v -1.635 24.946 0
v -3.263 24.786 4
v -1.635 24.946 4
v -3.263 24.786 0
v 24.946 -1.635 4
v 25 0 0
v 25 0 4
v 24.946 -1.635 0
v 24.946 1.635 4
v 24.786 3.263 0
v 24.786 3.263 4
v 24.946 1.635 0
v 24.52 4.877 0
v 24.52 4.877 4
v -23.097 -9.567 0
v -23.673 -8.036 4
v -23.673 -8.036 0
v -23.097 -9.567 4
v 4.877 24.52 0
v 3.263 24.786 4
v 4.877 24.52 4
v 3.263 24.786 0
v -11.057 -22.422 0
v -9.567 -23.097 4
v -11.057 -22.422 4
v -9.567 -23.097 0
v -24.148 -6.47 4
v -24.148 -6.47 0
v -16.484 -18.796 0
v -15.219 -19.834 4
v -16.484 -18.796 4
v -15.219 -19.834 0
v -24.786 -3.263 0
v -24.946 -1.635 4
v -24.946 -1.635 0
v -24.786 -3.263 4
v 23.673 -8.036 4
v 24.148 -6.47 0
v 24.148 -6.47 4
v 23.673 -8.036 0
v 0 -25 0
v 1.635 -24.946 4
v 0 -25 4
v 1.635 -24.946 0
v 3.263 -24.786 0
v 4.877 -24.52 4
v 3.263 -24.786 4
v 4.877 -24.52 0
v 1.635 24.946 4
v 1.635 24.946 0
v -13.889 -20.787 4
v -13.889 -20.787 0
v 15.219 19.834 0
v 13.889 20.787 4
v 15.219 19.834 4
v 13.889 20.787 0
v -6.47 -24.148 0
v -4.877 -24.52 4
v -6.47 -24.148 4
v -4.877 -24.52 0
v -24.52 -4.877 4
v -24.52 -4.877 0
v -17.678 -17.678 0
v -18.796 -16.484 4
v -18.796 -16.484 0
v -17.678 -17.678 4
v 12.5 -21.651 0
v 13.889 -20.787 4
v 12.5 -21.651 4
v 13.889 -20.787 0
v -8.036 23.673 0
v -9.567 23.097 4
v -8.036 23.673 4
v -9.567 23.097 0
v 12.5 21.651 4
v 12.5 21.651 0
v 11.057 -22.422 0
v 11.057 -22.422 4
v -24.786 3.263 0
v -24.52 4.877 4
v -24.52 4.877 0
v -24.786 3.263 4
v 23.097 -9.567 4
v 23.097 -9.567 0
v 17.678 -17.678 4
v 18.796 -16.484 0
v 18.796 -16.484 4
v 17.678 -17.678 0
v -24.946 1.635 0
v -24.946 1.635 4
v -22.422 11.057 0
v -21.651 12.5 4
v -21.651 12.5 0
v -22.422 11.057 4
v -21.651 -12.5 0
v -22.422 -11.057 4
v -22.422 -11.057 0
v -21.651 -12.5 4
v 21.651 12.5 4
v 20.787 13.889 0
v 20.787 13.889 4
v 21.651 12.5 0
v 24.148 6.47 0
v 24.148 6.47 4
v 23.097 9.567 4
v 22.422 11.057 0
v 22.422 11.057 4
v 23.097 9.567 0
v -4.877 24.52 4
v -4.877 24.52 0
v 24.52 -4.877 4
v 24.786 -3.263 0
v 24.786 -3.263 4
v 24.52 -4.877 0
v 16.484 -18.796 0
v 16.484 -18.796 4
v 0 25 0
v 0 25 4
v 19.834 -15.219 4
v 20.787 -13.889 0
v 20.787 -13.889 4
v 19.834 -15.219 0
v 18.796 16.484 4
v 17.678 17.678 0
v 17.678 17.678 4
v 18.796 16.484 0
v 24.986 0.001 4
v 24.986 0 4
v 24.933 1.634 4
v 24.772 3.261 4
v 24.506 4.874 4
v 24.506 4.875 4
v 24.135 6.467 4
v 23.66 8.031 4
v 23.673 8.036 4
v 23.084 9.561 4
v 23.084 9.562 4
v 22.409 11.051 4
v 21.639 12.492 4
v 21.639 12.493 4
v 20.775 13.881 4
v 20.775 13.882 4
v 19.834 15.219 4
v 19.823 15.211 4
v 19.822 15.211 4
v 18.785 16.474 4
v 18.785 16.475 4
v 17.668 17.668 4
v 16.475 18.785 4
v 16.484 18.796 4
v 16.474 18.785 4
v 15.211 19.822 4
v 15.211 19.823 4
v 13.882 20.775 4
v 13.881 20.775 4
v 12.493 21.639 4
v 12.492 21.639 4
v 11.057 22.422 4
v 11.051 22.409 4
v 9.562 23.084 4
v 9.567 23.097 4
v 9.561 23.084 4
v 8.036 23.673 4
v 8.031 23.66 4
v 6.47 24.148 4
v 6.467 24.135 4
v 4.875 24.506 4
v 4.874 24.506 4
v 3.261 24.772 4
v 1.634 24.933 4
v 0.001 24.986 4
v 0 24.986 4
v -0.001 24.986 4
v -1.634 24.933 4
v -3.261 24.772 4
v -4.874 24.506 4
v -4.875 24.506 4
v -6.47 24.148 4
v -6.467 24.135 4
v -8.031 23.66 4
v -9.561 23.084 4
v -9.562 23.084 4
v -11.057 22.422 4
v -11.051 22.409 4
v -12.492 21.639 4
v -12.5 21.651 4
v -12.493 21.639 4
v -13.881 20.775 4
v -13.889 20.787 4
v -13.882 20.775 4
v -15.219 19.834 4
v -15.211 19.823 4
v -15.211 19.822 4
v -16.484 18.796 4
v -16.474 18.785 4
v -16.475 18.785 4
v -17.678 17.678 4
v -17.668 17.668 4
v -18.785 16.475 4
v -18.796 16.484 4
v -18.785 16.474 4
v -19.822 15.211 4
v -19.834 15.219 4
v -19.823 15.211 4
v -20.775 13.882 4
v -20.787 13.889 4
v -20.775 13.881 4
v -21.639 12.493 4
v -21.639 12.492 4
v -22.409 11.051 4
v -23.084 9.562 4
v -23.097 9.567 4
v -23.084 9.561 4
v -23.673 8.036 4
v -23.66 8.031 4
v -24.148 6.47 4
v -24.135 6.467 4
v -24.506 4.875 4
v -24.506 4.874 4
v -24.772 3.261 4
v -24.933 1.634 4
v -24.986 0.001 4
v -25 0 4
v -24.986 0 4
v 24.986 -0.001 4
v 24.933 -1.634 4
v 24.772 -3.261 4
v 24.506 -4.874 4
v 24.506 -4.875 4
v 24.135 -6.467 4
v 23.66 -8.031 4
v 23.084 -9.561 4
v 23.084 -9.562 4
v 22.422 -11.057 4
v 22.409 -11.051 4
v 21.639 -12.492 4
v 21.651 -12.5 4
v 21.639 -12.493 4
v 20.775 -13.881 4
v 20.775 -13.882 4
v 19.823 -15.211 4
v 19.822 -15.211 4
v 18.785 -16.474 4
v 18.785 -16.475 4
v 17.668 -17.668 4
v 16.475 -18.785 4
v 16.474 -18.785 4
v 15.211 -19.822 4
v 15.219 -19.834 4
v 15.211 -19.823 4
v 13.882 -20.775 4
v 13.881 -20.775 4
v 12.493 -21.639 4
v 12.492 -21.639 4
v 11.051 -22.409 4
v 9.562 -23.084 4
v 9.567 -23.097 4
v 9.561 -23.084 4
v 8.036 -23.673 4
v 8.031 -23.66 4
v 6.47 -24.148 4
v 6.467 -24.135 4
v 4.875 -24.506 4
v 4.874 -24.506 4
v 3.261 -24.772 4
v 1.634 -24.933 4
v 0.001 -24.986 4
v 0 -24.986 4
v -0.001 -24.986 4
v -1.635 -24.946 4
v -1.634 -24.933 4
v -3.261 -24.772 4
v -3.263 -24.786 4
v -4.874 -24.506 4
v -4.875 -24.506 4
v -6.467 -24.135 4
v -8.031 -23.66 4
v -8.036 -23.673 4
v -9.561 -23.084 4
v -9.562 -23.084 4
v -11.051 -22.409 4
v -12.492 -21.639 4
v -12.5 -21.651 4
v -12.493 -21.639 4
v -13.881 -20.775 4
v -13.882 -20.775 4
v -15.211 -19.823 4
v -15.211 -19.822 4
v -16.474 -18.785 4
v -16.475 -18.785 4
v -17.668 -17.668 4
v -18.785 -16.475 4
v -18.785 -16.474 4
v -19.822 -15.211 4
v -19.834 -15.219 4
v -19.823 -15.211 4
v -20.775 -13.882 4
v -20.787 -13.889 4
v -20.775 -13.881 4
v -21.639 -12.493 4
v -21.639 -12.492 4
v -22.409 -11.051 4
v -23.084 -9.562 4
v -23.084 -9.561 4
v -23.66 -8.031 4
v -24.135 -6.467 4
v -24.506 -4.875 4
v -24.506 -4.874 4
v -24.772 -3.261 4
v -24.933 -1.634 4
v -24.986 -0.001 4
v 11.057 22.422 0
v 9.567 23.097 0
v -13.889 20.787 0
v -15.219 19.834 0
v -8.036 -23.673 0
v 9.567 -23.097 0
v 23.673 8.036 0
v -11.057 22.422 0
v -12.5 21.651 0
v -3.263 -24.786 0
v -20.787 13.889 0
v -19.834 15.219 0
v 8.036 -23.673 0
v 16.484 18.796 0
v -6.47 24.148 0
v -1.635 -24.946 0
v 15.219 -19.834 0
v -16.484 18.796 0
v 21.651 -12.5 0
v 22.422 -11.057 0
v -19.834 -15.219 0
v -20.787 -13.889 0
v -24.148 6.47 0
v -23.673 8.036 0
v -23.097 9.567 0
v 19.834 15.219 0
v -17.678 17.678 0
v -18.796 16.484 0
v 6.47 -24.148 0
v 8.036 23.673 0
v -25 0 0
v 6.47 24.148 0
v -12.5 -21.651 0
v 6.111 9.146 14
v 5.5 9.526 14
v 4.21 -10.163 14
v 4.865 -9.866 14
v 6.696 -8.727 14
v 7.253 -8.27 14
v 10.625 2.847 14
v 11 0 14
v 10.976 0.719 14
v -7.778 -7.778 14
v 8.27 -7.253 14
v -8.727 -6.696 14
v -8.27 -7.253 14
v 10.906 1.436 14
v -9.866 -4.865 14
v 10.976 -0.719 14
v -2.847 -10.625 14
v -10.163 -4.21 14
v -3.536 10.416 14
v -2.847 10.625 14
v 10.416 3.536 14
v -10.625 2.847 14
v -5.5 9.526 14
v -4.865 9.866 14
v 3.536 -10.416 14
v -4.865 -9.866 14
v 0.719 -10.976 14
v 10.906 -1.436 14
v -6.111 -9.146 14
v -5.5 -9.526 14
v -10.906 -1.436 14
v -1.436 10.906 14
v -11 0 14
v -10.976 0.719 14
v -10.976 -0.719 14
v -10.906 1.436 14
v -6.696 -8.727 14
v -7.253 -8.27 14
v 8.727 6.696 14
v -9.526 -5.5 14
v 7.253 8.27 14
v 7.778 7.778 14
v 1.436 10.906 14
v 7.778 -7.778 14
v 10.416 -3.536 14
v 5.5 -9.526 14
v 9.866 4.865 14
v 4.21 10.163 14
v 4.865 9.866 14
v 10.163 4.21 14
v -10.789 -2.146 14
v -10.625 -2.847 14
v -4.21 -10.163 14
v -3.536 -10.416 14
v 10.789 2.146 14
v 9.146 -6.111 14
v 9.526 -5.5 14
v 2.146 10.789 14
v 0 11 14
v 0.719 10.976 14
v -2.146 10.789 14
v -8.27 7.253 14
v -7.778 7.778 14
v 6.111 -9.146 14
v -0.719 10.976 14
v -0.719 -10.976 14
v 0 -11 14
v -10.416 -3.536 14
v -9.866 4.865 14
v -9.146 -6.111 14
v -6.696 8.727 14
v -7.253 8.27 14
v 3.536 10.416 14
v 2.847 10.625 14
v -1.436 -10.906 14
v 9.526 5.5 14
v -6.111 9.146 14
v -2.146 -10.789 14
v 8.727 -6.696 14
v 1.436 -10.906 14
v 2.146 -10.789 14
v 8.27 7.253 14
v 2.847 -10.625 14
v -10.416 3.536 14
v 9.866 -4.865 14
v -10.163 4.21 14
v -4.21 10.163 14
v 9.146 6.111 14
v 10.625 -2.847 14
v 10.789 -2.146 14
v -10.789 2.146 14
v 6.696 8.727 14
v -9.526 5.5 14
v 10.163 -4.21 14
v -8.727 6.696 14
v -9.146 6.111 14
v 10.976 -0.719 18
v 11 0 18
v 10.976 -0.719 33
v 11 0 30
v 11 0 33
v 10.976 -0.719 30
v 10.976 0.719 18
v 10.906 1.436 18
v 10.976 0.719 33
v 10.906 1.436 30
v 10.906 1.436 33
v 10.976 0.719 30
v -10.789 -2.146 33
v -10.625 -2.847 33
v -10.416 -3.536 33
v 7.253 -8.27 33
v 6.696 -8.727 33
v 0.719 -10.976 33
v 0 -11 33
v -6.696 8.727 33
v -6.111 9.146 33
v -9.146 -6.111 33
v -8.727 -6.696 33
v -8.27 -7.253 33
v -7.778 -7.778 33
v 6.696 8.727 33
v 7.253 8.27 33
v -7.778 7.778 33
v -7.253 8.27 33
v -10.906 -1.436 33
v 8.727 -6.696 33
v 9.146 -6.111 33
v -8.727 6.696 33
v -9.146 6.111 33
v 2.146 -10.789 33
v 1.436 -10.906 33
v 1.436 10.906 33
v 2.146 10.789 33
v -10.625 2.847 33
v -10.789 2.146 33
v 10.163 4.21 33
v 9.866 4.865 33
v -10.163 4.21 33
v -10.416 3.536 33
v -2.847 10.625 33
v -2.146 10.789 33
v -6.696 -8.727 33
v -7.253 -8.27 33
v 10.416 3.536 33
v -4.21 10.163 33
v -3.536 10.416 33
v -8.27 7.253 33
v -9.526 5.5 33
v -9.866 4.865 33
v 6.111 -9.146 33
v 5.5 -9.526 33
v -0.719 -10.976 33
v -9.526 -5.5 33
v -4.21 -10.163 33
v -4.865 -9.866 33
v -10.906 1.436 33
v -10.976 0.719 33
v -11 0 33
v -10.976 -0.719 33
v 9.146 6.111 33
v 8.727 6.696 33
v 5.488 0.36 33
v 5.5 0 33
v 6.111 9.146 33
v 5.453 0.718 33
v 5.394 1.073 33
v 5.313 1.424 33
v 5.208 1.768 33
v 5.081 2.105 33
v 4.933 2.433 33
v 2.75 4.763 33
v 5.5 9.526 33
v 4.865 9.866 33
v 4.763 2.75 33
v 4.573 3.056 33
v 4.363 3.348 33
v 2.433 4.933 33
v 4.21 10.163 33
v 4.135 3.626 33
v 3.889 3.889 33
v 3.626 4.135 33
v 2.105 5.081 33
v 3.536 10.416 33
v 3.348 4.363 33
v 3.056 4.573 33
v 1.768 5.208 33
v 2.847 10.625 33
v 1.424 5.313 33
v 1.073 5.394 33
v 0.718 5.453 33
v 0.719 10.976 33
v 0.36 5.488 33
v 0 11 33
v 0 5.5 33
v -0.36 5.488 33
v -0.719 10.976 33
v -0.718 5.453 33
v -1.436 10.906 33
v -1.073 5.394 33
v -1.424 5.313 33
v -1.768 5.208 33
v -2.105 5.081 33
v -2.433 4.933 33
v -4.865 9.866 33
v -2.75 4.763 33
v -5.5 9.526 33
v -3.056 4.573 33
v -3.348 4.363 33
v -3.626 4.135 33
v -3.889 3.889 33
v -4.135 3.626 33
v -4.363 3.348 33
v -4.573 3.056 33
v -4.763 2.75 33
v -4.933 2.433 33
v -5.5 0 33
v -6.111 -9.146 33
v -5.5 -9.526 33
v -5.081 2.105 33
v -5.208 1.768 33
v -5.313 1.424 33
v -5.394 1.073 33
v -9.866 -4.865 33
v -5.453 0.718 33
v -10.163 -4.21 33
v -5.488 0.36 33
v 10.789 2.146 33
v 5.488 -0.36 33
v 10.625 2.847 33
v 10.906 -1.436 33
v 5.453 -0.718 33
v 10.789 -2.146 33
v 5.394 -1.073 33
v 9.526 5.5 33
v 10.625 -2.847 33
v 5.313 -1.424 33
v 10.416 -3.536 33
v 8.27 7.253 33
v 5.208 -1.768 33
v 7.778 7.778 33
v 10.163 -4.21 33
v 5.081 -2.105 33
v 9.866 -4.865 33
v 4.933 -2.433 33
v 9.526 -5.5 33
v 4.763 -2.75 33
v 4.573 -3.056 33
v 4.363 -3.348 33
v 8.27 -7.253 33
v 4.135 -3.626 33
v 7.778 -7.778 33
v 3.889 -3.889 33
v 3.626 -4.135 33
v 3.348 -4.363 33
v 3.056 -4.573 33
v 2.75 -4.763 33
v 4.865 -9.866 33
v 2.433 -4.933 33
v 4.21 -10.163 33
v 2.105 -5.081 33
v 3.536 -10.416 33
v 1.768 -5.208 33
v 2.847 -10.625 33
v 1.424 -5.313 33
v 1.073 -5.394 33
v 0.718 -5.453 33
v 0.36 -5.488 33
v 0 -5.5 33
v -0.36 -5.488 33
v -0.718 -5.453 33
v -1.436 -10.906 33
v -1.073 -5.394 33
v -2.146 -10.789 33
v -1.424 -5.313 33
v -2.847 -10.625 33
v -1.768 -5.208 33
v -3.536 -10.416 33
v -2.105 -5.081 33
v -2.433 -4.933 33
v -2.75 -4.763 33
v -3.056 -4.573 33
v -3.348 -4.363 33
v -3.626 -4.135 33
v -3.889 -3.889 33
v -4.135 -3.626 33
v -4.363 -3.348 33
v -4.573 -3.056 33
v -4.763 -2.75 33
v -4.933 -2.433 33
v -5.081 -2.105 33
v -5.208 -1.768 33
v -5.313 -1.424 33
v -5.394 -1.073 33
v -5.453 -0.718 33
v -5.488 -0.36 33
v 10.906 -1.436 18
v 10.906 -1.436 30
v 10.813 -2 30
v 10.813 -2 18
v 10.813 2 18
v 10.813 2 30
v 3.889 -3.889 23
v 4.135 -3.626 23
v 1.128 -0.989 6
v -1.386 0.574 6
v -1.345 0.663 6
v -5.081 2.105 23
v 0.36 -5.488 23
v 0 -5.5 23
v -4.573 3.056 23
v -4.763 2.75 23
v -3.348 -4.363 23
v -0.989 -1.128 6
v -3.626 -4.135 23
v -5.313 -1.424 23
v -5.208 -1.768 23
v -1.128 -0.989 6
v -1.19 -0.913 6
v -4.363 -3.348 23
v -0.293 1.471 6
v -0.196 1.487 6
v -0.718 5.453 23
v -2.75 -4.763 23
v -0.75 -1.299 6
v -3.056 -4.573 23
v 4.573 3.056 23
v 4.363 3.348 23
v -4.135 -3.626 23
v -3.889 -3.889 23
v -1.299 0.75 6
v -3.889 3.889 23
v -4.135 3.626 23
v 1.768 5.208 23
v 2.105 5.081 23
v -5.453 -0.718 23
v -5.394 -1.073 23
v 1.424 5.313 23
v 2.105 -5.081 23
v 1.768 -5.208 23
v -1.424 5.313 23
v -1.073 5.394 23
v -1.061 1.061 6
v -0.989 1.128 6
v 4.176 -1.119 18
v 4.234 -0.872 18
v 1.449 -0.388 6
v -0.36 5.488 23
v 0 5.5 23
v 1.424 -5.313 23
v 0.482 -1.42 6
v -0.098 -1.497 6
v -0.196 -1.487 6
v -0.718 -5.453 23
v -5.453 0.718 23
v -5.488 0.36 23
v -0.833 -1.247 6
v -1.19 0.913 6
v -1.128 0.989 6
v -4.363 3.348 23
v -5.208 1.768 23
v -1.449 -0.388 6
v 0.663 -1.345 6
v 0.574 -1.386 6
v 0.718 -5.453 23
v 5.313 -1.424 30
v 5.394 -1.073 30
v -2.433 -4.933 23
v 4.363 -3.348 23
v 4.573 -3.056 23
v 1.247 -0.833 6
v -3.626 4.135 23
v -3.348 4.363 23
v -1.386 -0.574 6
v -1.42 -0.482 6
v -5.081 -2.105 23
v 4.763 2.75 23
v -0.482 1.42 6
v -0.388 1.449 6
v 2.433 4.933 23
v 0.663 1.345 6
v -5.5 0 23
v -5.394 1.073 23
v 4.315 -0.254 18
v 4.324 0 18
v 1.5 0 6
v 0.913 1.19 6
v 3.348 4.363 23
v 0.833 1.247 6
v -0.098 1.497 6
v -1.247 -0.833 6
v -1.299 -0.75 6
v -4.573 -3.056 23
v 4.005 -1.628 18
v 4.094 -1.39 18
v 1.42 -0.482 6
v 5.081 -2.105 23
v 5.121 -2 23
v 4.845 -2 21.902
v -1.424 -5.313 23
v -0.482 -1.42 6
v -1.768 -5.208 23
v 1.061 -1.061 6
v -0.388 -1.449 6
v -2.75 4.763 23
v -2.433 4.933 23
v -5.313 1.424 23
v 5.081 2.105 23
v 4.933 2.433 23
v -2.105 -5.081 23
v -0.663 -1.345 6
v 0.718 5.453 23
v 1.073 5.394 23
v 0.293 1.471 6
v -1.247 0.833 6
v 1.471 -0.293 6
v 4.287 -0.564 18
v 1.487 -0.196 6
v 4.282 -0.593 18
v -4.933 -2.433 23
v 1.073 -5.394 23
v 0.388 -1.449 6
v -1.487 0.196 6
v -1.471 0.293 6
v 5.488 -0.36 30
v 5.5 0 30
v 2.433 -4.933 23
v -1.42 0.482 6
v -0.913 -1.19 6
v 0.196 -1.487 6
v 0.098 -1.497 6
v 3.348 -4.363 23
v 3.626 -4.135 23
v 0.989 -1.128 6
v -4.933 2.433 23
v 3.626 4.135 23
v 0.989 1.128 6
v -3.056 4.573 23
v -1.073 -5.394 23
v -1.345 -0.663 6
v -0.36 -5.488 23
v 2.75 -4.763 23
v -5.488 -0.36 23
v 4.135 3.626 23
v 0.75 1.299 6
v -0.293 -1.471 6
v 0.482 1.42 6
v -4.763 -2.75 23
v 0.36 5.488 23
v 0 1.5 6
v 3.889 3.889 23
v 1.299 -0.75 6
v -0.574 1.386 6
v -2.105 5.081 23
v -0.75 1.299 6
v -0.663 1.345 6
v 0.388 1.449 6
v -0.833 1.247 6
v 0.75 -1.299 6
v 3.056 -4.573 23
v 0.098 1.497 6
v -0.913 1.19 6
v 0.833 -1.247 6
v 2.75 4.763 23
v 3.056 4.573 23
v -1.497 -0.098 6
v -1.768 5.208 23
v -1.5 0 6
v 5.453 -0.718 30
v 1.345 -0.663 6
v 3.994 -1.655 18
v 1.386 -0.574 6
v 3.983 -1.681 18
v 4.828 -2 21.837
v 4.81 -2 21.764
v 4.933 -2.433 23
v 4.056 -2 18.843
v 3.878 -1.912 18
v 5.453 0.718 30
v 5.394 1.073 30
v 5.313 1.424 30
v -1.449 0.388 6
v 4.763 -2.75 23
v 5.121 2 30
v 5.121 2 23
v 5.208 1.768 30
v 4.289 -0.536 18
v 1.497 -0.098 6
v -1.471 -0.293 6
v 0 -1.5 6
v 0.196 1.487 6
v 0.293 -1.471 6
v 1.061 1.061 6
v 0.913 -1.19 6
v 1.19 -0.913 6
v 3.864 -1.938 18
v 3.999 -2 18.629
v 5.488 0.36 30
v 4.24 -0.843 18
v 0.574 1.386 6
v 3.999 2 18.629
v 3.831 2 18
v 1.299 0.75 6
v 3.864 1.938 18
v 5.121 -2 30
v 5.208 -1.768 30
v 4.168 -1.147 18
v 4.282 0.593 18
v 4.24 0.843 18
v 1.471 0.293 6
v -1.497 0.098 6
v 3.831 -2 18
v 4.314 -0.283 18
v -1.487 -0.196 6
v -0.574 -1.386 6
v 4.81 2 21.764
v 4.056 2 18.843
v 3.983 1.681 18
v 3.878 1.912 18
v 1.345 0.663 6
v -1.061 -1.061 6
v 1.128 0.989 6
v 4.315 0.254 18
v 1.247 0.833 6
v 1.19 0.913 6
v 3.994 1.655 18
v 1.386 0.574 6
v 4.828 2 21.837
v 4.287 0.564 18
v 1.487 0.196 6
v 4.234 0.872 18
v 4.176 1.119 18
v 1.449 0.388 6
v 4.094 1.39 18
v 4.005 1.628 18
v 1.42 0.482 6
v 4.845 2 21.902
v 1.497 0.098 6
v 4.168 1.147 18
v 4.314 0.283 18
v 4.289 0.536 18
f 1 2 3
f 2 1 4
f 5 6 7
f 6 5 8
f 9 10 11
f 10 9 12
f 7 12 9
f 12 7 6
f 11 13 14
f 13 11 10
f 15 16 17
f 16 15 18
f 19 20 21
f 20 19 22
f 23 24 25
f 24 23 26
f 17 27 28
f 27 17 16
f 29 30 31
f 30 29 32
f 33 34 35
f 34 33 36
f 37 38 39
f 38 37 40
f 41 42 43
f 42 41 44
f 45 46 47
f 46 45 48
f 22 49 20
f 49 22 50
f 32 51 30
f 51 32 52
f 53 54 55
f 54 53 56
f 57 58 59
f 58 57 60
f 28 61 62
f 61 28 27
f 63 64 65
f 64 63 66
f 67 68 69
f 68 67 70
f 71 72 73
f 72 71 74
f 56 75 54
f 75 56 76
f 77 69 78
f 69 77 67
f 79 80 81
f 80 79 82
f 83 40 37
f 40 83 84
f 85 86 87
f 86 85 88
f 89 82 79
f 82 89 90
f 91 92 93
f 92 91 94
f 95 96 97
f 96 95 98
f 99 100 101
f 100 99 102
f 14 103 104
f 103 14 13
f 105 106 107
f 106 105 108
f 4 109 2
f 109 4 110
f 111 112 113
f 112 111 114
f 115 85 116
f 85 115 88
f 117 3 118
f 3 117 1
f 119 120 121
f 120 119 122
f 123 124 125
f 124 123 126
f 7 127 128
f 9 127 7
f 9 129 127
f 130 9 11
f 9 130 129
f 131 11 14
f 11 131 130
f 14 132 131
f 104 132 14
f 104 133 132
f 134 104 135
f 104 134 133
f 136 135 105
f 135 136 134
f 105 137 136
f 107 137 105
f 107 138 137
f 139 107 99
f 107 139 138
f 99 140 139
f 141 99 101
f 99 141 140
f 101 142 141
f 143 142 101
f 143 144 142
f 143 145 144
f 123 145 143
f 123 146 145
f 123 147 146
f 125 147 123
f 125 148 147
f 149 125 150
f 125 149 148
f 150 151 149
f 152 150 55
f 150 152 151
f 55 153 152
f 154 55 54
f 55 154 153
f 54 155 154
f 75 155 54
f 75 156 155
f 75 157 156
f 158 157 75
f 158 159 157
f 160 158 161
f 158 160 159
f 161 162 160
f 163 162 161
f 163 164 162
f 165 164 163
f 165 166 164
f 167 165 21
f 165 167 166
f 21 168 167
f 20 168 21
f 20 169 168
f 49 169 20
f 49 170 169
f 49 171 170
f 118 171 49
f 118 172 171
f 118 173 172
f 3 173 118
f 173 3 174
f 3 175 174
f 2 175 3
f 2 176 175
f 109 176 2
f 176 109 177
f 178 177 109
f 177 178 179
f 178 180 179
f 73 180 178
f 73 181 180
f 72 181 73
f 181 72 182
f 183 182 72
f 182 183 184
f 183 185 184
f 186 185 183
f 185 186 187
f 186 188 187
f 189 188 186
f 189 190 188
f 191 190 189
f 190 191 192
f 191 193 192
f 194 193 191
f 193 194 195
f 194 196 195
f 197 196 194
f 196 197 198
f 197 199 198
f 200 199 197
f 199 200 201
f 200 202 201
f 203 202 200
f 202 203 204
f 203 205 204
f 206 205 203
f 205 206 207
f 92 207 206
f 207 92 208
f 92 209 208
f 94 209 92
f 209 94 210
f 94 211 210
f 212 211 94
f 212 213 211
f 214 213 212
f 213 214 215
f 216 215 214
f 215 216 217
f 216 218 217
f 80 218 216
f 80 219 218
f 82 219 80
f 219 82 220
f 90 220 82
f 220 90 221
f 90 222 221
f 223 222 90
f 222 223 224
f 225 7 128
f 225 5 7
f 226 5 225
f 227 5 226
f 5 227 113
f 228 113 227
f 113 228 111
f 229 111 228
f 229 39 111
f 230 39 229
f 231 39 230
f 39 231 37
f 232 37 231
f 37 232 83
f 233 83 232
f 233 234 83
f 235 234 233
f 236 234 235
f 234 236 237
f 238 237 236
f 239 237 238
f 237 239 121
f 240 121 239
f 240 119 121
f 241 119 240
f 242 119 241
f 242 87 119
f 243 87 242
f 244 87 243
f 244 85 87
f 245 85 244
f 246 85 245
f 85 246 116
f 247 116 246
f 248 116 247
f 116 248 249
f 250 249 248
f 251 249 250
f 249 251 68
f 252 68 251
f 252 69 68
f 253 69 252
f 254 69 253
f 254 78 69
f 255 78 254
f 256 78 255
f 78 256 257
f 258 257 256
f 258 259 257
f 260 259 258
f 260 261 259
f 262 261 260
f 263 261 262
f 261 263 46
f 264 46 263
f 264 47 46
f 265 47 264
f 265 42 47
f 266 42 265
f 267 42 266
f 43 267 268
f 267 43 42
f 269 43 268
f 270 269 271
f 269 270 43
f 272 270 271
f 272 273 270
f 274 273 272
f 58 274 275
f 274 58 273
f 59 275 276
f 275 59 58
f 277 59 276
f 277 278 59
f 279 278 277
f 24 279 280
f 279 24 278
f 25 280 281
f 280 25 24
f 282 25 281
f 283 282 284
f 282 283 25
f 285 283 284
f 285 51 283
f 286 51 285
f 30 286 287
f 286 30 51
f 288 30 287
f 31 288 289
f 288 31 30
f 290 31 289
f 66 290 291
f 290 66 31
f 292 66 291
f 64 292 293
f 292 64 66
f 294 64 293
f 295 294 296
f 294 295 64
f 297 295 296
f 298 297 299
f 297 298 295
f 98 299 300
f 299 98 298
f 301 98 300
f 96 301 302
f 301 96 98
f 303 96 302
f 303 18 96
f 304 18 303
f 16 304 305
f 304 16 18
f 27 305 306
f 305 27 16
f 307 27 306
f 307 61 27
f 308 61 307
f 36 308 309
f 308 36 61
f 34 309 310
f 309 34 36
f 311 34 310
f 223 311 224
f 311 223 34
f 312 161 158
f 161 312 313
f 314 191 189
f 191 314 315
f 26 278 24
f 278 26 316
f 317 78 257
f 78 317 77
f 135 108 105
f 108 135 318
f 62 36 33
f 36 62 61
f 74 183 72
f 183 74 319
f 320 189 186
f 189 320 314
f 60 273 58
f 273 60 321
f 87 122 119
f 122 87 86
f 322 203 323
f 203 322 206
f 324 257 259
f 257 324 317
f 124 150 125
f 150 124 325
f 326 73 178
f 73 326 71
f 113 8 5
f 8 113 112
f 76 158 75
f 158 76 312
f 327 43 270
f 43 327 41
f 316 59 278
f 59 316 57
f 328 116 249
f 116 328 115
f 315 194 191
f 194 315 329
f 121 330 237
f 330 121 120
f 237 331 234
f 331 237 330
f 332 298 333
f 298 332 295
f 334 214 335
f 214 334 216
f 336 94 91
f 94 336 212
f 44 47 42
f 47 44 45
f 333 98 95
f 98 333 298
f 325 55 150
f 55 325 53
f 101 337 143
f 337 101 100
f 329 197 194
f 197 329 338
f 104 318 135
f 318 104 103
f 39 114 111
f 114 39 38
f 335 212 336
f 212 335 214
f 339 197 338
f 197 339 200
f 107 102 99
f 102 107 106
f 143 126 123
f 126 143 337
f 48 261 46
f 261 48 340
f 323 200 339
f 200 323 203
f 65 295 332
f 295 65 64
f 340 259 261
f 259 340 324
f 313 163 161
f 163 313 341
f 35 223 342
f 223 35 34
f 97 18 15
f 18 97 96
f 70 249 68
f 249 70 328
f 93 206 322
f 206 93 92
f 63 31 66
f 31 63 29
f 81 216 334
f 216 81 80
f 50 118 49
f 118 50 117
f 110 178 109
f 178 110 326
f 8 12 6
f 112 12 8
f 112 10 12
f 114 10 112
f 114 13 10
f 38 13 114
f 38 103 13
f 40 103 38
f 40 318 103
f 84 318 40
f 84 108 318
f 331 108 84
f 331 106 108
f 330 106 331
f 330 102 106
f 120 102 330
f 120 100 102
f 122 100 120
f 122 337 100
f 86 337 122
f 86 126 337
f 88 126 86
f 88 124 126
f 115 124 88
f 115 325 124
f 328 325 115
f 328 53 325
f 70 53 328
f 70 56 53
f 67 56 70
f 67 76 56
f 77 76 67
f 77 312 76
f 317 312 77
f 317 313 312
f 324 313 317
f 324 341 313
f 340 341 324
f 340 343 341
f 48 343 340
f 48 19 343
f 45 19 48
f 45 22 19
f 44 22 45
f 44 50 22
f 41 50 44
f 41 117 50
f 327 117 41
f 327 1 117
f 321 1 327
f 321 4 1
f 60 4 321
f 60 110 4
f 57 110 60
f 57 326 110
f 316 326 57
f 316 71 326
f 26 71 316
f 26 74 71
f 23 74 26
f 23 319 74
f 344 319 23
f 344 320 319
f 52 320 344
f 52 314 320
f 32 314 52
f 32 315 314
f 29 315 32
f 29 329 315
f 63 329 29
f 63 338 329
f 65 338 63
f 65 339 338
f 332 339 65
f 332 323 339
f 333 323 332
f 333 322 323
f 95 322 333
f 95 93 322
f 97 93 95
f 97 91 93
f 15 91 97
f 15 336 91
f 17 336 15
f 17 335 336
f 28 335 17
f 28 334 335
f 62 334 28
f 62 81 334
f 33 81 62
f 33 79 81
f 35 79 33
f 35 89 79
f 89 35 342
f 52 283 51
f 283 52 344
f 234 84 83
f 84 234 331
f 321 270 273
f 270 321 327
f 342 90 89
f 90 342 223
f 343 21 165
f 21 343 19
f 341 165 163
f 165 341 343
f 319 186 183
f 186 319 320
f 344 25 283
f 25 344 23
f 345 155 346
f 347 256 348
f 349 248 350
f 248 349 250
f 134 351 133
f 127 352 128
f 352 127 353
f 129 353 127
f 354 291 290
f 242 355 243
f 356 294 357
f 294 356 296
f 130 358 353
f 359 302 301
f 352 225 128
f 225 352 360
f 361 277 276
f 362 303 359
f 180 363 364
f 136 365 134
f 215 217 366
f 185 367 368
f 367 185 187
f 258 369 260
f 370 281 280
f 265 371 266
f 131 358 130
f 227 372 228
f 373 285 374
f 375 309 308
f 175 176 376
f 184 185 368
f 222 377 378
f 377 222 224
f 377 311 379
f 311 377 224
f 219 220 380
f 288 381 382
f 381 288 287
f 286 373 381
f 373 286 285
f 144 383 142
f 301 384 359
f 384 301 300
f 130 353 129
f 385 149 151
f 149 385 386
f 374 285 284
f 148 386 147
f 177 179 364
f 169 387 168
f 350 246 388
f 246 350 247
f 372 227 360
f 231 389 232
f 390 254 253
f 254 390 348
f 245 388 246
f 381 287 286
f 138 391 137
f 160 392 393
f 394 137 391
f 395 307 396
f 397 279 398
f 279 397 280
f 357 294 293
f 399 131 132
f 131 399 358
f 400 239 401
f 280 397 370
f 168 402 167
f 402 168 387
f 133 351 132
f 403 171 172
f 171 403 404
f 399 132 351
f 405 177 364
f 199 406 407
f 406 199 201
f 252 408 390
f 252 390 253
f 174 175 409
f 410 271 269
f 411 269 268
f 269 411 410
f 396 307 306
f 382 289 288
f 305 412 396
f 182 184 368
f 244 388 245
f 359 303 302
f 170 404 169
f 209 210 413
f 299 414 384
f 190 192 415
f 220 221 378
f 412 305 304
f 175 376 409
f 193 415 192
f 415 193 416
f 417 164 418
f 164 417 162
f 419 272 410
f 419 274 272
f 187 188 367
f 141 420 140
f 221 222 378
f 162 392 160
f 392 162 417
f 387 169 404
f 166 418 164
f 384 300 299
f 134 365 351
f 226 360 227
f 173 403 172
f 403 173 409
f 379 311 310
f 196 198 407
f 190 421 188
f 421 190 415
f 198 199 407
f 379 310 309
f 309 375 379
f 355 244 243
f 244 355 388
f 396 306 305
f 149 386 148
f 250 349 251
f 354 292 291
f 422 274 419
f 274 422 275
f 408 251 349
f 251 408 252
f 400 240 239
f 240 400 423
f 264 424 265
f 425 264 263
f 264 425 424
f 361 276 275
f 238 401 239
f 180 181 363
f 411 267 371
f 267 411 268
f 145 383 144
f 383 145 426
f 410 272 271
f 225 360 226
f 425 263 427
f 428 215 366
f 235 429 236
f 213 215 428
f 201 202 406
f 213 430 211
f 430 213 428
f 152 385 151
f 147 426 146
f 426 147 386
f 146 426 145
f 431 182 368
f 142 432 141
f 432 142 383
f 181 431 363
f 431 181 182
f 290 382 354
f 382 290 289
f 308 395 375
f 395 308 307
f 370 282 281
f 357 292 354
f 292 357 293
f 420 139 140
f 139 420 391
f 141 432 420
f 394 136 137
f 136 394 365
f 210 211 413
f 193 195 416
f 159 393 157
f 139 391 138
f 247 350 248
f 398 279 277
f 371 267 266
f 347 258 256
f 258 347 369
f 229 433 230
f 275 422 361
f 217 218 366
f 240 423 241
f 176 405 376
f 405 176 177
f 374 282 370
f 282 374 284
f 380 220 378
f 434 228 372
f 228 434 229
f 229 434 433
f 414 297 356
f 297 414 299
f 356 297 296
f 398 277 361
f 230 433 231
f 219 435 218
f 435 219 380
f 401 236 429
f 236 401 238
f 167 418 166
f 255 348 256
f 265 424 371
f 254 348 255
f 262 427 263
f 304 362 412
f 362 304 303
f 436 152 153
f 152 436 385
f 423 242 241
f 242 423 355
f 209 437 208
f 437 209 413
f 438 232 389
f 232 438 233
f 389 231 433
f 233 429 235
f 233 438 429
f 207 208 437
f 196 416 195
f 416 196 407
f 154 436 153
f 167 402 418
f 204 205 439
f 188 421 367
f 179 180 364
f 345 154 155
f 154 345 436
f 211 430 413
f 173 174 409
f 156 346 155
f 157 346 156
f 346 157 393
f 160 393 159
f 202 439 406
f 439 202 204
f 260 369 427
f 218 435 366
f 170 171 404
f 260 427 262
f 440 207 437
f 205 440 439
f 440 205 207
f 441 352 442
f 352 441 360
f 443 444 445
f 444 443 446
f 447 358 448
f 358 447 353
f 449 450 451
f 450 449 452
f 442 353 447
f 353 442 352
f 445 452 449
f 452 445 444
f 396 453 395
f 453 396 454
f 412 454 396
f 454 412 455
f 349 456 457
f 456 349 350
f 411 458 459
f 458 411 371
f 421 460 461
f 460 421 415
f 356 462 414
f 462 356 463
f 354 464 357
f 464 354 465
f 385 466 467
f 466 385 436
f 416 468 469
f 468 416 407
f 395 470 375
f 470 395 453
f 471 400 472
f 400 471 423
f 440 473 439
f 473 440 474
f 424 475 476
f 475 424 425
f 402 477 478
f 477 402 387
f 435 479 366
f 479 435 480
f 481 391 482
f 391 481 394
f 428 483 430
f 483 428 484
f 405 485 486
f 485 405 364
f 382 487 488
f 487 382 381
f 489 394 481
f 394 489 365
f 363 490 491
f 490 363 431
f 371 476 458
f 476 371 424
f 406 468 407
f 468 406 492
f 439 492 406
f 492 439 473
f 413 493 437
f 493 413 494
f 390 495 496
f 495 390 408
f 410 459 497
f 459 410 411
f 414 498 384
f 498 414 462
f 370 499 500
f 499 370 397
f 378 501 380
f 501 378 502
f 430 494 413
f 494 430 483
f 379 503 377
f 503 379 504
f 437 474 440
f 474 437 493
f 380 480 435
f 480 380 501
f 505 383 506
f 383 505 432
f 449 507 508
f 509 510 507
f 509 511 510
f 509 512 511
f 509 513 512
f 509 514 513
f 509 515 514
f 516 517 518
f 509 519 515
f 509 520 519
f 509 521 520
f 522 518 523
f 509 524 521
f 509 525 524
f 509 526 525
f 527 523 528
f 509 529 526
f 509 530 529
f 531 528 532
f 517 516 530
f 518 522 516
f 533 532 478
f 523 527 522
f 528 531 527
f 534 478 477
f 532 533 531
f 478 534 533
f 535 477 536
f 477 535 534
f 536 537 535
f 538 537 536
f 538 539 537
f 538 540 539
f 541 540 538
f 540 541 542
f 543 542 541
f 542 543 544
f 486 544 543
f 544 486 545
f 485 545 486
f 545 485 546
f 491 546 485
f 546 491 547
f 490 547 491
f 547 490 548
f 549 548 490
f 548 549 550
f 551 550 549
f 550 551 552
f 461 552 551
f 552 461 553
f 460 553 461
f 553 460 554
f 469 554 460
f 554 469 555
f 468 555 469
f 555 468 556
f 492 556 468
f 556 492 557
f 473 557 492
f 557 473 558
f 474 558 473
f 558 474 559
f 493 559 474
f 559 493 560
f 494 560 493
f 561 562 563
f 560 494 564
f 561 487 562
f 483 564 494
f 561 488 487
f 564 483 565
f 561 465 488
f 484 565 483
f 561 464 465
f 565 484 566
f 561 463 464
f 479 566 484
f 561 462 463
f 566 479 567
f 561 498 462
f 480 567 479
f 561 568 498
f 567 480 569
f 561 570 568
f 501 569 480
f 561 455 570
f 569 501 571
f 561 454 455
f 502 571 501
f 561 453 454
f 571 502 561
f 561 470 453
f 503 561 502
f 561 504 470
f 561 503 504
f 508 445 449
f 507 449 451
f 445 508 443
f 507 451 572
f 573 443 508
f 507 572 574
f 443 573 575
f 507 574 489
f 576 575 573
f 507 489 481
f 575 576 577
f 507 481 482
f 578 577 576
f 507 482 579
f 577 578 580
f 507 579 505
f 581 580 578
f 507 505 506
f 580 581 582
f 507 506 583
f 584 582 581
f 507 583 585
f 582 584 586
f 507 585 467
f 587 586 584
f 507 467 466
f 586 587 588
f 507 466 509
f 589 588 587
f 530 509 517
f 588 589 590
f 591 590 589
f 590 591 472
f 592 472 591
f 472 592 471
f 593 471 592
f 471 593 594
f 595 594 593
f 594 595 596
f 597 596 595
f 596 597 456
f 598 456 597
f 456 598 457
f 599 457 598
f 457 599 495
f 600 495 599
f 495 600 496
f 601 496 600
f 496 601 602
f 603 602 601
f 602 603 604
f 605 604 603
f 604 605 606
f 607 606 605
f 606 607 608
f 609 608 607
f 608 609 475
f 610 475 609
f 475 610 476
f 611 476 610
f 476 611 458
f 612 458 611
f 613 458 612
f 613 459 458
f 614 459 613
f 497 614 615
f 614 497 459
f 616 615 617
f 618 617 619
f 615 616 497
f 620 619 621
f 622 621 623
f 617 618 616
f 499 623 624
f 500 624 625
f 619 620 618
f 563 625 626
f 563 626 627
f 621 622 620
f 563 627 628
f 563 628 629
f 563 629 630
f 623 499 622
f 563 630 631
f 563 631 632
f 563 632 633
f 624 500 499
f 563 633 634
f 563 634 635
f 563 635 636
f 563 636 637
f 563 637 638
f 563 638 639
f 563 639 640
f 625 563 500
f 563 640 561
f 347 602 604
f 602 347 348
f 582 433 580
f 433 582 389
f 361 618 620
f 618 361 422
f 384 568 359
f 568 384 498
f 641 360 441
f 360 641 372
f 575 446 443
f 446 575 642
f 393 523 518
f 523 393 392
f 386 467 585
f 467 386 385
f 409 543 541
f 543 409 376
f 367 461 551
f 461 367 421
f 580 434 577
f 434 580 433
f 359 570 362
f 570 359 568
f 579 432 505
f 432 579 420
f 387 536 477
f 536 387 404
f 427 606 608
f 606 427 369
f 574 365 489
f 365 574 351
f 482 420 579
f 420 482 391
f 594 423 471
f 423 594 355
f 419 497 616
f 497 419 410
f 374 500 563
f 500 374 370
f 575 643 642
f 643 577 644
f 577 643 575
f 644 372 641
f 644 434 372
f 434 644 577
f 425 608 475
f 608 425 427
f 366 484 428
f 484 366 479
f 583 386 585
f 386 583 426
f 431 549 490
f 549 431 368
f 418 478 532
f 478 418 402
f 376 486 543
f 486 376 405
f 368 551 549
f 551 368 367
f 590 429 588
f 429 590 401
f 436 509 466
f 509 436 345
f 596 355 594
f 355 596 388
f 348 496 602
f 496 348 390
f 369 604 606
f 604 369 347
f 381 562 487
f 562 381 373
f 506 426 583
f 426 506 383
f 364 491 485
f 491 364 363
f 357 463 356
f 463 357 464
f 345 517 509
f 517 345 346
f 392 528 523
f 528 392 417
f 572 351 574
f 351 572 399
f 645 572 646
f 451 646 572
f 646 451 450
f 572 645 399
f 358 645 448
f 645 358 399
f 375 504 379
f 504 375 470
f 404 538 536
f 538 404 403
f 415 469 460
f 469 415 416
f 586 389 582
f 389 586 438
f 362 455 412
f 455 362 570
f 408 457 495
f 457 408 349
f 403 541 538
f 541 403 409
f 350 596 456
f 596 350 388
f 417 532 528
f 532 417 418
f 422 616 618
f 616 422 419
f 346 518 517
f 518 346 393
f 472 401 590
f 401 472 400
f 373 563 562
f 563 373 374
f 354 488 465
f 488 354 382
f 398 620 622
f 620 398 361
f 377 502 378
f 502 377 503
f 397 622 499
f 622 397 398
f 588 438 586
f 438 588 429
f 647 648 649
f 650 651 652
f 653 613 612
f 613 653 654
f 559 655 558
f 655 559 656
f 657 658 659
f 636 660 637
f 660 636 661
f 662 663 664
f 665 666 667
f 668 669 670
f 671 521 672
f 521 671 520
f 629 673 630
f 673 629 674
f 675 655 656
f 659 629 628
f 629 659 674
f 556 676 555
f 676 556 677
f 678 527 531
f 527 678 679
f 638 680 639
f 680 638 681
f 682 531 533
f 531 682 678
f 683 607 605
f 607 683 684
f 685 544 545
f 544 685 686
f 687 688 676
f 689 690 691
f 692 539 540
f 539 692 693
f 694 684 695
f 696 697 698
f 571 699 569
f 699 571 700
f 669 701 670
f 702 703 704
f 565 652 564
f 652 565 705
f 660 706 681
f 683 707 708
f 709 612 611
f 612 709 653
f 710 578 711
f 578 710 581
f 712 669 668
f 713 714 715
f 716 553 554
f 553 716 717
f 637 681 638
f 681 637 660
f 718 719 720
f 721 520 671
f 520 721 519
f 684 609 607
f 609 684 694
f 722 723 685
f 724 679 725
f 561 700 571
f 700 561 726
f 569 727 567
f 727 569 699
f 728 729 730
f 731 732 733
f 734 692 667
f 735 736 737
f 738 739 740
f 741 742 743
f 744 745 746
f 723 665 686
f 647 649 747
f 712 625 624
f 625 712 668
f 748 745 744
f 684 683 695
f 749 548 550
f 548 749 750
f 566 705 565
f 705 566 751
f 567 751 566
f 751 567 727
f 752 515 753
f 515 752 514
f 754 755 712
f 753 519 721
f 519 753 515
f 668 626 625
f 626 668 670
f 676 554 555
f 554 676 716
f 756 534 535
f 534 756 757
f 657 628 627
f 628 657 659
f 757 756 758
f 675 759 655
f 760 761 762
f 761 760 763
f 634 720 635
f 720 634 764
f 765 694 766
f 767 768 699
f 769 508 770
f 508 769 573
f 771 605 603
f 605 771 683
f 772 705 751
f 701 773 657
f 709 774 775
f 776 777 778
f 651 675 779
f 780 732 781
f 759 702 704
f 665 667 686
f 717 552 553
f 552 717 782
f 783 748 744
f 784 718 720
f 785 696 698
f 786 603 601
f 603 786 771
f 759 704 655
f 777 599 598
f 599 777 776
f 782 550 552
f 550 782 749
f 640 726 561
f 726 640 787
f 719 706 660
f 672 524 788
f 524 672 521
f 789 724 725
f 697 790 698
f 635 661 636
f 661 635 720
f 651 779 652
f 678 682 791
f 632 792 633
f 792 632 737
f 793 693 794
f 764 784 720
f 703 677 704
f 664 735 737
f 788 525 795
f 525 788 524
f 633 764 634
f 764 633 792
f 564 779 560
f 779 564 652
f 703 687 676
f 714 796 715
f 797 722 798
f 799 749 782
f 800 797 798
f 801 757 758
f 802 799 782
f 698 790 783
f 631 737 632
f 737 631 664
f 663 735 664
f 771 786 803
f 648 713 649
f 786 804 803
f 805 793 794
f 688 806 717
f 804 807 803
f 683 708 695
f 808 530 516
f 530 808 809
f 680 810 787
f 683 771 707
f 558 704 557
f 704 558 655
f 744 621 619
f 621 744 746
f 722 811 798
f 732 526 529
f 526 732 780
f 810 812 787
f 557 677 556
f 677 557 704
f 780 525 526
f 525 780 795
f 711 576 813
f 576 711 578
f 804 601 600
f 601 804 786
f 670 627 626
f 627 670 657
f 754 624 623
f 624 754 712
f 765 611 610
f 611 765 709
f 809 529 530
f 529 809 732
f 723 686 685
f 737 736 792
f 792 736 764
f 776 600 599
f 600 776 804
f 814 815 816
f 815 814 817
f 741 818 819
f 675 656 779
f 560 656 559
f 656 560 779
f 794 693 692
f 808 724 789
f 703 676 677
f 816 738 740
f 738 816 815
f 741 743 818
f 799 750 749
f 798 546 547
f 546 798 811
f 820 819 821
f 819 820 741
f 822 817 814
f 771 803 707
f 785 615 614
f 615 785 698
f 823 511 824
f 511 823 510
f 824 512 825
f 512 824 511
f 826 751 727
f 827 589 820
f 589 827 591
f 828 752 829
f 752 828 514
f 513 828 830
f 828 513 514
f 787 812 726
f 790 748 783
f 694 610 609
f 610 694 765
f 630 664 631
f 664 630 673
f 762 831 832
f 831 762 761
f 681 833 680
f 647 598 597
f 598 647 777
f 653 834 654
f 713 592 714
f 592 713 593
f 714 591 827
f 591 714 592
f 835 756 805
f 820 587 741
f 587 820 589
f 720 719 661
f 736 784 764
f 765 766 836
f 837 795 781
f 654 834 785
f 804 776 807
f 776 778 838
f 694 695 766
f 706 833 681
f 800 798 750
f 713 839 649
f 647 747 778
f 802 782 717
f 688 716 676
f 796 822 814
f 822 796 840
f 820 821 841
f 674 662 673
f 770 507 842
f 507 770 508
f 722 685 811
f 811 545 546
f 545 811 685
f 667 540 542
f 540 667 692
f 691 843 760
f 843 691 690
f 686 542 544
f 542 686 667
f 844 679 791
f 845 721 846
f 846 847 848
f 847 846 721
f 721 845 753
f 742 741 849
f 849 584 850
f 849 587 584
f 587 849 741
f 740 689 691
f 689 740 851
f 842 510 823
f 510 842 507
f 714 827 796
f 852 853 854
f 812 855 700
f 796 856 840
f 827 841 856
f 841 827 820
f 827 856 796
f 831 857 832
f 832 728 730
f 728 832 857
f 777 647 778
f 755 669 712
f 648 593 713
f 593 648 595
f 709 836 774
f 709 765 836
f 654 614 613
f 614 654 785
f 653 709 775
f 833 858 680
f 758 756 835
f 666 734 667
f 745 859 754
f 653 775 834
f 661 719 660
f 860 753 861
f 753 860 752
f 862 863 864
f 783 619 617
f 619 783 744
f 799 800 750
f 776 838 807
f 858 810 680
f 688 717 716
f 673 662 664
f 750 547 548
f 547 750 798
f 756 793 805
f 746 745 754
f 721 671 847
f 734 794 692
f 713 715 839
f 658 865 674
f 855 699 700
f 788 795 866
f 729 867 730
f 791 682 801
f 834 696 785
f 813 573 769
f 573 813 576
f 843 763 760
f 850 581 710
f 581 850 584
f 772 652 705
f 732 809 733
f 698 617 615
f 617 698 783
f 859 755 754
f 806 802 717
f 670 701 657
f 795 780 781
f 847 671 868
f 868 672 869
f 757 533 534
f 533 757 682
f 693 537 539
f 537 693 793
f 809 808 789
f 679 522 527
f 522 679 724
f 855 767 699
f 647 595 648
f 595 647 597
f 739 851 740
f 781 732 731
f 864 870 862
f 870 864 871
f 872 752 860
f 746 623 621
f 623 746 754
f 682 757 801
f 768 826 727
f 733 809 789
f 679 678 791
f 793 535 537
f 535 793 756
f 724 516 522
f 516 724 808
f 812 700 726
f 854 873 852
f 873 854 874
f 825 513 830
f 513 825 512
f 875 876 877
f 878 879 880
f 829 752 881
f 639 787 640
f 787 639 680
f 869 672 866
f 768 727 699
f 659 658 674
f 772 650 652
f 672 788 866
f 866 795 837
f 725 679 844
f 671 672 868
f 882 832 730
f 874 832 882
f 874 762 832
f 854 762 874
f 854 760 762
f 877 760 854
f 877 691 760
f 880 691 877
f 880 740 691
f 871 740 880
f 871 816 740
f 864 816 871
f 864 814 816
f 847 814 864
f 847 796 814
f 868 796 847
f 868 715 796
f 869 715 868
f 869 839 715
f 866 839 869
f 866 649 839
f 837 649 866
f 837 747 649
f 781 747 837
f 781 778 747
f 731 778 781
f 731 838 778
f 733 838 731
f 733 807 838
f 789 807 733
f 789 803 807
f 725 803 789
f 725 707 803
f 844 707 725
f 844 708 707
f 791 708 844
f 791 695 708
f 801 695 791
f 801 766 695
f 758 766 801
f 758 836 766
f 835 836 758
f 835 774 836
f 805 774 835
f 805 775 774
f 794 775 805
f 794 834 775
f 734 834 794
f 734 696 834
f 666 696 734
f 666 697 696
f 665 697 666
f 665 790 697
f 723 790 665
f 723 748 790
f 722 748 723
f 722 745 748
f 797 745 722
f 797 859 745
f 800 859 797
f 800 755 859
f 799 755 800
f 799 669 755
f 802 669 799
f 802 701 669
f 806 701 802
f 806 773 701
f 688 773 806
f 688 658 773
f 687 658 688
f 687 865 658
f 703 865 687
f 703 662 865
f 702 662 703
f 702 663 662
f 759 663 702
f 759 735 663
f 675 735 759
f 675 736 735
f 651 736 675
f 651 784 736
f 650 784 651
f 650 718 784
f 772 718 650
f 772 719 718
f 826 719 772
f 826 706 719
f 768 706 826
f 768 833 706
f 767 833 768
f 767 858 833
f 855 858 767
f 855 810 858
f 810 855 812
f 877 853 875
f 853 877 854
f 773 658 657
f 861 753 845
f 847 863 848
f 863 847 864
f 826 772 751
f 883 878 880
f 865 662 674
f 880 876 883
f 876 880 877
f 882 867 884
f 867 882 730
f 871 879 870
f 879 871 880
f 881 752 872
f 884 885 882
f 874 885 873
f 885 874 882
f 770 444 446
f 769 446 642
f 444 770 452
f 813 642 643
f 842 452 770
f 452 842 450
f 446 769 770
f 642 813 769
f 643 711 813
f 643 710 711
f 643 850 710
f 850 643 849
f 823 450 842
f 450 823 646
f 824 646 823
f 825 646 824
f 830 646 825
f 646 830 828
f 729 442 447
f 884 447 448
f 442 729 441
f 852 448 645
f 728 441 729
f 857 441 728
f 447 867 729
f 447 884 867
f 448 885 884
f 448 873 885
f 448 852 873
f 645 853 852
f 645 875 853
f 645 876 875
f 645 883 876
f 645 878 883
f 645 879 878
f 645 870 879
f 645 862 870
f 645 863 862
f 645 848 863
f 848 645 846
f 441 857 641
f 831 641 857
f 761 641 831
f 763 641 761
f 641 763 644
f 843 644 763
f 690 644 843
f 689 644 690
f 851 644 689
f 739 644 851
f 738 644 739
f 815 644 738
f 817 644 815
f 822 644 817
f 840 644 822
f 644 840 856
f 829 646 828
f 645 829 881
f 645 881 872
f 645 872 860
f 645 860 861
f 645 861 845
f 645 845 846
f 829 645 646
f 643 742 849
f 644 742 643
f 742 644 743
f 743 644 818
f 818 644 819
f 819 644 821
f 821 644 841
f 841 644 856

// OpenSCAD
// Tube stand for 1.5 mL microcentrifuge tube (print standing up)
$fn = 96;

base_d      = 50;   // base disc diameter
base_h      = 4;    // base disc height (z 0..4)
cone_top_z  = 14;   // top of outer cone
col_d       = 22;   // column diameter
col_top_z   = 33;   // top of column

seat_d      = 11;   // cylindrical seat diameter
seat_cyl_z  = 23;   // bottom of cylindrical seat portion
seat_tip_z  = 6;    // bottom of conical seat
seat_tip_d  = 3;    // diameter at seat bottom

win_w       = 4;    // window width (Y)
win_z0      = 18;   // window bottom
win_z1      = 30;   // window top

eps = 0.01;
ext = 1;            // cutter overshoot

difference() {
    union() {
        // base disc
        cylinder(d = base_d, h = base_h);
        // outer cone
        translate([0, 0, base_h - eps])
            cylinder(d1 = base_d, d2 = col_d, h = cone_top_z - base_h + eps);
        // column
        translate([0, 0, cone_top_z - eps])
            cylinder(d = col_d, h = col_top_z - cone_top_z + eps);
    }

    // seat: cylinder + cone tip (revolved profile)
    rotate_extrude()
        polygon([
            [0, seat_tip_z],
            [seat_tip_d / 2, seat_tip_z],
            [seat_d / 2, seat_cyl_z],
            [seat_d / 2, col_top_z + ext],
            [0, col_top_z + ext]
        ]);

    // viewing window on +X side, from the seat axis out through the wall
    translate([0, -win_w / 2, win_z0])
        cube([col_d / 2 + ext, win_w, win_z1 - win_z0]);
}
